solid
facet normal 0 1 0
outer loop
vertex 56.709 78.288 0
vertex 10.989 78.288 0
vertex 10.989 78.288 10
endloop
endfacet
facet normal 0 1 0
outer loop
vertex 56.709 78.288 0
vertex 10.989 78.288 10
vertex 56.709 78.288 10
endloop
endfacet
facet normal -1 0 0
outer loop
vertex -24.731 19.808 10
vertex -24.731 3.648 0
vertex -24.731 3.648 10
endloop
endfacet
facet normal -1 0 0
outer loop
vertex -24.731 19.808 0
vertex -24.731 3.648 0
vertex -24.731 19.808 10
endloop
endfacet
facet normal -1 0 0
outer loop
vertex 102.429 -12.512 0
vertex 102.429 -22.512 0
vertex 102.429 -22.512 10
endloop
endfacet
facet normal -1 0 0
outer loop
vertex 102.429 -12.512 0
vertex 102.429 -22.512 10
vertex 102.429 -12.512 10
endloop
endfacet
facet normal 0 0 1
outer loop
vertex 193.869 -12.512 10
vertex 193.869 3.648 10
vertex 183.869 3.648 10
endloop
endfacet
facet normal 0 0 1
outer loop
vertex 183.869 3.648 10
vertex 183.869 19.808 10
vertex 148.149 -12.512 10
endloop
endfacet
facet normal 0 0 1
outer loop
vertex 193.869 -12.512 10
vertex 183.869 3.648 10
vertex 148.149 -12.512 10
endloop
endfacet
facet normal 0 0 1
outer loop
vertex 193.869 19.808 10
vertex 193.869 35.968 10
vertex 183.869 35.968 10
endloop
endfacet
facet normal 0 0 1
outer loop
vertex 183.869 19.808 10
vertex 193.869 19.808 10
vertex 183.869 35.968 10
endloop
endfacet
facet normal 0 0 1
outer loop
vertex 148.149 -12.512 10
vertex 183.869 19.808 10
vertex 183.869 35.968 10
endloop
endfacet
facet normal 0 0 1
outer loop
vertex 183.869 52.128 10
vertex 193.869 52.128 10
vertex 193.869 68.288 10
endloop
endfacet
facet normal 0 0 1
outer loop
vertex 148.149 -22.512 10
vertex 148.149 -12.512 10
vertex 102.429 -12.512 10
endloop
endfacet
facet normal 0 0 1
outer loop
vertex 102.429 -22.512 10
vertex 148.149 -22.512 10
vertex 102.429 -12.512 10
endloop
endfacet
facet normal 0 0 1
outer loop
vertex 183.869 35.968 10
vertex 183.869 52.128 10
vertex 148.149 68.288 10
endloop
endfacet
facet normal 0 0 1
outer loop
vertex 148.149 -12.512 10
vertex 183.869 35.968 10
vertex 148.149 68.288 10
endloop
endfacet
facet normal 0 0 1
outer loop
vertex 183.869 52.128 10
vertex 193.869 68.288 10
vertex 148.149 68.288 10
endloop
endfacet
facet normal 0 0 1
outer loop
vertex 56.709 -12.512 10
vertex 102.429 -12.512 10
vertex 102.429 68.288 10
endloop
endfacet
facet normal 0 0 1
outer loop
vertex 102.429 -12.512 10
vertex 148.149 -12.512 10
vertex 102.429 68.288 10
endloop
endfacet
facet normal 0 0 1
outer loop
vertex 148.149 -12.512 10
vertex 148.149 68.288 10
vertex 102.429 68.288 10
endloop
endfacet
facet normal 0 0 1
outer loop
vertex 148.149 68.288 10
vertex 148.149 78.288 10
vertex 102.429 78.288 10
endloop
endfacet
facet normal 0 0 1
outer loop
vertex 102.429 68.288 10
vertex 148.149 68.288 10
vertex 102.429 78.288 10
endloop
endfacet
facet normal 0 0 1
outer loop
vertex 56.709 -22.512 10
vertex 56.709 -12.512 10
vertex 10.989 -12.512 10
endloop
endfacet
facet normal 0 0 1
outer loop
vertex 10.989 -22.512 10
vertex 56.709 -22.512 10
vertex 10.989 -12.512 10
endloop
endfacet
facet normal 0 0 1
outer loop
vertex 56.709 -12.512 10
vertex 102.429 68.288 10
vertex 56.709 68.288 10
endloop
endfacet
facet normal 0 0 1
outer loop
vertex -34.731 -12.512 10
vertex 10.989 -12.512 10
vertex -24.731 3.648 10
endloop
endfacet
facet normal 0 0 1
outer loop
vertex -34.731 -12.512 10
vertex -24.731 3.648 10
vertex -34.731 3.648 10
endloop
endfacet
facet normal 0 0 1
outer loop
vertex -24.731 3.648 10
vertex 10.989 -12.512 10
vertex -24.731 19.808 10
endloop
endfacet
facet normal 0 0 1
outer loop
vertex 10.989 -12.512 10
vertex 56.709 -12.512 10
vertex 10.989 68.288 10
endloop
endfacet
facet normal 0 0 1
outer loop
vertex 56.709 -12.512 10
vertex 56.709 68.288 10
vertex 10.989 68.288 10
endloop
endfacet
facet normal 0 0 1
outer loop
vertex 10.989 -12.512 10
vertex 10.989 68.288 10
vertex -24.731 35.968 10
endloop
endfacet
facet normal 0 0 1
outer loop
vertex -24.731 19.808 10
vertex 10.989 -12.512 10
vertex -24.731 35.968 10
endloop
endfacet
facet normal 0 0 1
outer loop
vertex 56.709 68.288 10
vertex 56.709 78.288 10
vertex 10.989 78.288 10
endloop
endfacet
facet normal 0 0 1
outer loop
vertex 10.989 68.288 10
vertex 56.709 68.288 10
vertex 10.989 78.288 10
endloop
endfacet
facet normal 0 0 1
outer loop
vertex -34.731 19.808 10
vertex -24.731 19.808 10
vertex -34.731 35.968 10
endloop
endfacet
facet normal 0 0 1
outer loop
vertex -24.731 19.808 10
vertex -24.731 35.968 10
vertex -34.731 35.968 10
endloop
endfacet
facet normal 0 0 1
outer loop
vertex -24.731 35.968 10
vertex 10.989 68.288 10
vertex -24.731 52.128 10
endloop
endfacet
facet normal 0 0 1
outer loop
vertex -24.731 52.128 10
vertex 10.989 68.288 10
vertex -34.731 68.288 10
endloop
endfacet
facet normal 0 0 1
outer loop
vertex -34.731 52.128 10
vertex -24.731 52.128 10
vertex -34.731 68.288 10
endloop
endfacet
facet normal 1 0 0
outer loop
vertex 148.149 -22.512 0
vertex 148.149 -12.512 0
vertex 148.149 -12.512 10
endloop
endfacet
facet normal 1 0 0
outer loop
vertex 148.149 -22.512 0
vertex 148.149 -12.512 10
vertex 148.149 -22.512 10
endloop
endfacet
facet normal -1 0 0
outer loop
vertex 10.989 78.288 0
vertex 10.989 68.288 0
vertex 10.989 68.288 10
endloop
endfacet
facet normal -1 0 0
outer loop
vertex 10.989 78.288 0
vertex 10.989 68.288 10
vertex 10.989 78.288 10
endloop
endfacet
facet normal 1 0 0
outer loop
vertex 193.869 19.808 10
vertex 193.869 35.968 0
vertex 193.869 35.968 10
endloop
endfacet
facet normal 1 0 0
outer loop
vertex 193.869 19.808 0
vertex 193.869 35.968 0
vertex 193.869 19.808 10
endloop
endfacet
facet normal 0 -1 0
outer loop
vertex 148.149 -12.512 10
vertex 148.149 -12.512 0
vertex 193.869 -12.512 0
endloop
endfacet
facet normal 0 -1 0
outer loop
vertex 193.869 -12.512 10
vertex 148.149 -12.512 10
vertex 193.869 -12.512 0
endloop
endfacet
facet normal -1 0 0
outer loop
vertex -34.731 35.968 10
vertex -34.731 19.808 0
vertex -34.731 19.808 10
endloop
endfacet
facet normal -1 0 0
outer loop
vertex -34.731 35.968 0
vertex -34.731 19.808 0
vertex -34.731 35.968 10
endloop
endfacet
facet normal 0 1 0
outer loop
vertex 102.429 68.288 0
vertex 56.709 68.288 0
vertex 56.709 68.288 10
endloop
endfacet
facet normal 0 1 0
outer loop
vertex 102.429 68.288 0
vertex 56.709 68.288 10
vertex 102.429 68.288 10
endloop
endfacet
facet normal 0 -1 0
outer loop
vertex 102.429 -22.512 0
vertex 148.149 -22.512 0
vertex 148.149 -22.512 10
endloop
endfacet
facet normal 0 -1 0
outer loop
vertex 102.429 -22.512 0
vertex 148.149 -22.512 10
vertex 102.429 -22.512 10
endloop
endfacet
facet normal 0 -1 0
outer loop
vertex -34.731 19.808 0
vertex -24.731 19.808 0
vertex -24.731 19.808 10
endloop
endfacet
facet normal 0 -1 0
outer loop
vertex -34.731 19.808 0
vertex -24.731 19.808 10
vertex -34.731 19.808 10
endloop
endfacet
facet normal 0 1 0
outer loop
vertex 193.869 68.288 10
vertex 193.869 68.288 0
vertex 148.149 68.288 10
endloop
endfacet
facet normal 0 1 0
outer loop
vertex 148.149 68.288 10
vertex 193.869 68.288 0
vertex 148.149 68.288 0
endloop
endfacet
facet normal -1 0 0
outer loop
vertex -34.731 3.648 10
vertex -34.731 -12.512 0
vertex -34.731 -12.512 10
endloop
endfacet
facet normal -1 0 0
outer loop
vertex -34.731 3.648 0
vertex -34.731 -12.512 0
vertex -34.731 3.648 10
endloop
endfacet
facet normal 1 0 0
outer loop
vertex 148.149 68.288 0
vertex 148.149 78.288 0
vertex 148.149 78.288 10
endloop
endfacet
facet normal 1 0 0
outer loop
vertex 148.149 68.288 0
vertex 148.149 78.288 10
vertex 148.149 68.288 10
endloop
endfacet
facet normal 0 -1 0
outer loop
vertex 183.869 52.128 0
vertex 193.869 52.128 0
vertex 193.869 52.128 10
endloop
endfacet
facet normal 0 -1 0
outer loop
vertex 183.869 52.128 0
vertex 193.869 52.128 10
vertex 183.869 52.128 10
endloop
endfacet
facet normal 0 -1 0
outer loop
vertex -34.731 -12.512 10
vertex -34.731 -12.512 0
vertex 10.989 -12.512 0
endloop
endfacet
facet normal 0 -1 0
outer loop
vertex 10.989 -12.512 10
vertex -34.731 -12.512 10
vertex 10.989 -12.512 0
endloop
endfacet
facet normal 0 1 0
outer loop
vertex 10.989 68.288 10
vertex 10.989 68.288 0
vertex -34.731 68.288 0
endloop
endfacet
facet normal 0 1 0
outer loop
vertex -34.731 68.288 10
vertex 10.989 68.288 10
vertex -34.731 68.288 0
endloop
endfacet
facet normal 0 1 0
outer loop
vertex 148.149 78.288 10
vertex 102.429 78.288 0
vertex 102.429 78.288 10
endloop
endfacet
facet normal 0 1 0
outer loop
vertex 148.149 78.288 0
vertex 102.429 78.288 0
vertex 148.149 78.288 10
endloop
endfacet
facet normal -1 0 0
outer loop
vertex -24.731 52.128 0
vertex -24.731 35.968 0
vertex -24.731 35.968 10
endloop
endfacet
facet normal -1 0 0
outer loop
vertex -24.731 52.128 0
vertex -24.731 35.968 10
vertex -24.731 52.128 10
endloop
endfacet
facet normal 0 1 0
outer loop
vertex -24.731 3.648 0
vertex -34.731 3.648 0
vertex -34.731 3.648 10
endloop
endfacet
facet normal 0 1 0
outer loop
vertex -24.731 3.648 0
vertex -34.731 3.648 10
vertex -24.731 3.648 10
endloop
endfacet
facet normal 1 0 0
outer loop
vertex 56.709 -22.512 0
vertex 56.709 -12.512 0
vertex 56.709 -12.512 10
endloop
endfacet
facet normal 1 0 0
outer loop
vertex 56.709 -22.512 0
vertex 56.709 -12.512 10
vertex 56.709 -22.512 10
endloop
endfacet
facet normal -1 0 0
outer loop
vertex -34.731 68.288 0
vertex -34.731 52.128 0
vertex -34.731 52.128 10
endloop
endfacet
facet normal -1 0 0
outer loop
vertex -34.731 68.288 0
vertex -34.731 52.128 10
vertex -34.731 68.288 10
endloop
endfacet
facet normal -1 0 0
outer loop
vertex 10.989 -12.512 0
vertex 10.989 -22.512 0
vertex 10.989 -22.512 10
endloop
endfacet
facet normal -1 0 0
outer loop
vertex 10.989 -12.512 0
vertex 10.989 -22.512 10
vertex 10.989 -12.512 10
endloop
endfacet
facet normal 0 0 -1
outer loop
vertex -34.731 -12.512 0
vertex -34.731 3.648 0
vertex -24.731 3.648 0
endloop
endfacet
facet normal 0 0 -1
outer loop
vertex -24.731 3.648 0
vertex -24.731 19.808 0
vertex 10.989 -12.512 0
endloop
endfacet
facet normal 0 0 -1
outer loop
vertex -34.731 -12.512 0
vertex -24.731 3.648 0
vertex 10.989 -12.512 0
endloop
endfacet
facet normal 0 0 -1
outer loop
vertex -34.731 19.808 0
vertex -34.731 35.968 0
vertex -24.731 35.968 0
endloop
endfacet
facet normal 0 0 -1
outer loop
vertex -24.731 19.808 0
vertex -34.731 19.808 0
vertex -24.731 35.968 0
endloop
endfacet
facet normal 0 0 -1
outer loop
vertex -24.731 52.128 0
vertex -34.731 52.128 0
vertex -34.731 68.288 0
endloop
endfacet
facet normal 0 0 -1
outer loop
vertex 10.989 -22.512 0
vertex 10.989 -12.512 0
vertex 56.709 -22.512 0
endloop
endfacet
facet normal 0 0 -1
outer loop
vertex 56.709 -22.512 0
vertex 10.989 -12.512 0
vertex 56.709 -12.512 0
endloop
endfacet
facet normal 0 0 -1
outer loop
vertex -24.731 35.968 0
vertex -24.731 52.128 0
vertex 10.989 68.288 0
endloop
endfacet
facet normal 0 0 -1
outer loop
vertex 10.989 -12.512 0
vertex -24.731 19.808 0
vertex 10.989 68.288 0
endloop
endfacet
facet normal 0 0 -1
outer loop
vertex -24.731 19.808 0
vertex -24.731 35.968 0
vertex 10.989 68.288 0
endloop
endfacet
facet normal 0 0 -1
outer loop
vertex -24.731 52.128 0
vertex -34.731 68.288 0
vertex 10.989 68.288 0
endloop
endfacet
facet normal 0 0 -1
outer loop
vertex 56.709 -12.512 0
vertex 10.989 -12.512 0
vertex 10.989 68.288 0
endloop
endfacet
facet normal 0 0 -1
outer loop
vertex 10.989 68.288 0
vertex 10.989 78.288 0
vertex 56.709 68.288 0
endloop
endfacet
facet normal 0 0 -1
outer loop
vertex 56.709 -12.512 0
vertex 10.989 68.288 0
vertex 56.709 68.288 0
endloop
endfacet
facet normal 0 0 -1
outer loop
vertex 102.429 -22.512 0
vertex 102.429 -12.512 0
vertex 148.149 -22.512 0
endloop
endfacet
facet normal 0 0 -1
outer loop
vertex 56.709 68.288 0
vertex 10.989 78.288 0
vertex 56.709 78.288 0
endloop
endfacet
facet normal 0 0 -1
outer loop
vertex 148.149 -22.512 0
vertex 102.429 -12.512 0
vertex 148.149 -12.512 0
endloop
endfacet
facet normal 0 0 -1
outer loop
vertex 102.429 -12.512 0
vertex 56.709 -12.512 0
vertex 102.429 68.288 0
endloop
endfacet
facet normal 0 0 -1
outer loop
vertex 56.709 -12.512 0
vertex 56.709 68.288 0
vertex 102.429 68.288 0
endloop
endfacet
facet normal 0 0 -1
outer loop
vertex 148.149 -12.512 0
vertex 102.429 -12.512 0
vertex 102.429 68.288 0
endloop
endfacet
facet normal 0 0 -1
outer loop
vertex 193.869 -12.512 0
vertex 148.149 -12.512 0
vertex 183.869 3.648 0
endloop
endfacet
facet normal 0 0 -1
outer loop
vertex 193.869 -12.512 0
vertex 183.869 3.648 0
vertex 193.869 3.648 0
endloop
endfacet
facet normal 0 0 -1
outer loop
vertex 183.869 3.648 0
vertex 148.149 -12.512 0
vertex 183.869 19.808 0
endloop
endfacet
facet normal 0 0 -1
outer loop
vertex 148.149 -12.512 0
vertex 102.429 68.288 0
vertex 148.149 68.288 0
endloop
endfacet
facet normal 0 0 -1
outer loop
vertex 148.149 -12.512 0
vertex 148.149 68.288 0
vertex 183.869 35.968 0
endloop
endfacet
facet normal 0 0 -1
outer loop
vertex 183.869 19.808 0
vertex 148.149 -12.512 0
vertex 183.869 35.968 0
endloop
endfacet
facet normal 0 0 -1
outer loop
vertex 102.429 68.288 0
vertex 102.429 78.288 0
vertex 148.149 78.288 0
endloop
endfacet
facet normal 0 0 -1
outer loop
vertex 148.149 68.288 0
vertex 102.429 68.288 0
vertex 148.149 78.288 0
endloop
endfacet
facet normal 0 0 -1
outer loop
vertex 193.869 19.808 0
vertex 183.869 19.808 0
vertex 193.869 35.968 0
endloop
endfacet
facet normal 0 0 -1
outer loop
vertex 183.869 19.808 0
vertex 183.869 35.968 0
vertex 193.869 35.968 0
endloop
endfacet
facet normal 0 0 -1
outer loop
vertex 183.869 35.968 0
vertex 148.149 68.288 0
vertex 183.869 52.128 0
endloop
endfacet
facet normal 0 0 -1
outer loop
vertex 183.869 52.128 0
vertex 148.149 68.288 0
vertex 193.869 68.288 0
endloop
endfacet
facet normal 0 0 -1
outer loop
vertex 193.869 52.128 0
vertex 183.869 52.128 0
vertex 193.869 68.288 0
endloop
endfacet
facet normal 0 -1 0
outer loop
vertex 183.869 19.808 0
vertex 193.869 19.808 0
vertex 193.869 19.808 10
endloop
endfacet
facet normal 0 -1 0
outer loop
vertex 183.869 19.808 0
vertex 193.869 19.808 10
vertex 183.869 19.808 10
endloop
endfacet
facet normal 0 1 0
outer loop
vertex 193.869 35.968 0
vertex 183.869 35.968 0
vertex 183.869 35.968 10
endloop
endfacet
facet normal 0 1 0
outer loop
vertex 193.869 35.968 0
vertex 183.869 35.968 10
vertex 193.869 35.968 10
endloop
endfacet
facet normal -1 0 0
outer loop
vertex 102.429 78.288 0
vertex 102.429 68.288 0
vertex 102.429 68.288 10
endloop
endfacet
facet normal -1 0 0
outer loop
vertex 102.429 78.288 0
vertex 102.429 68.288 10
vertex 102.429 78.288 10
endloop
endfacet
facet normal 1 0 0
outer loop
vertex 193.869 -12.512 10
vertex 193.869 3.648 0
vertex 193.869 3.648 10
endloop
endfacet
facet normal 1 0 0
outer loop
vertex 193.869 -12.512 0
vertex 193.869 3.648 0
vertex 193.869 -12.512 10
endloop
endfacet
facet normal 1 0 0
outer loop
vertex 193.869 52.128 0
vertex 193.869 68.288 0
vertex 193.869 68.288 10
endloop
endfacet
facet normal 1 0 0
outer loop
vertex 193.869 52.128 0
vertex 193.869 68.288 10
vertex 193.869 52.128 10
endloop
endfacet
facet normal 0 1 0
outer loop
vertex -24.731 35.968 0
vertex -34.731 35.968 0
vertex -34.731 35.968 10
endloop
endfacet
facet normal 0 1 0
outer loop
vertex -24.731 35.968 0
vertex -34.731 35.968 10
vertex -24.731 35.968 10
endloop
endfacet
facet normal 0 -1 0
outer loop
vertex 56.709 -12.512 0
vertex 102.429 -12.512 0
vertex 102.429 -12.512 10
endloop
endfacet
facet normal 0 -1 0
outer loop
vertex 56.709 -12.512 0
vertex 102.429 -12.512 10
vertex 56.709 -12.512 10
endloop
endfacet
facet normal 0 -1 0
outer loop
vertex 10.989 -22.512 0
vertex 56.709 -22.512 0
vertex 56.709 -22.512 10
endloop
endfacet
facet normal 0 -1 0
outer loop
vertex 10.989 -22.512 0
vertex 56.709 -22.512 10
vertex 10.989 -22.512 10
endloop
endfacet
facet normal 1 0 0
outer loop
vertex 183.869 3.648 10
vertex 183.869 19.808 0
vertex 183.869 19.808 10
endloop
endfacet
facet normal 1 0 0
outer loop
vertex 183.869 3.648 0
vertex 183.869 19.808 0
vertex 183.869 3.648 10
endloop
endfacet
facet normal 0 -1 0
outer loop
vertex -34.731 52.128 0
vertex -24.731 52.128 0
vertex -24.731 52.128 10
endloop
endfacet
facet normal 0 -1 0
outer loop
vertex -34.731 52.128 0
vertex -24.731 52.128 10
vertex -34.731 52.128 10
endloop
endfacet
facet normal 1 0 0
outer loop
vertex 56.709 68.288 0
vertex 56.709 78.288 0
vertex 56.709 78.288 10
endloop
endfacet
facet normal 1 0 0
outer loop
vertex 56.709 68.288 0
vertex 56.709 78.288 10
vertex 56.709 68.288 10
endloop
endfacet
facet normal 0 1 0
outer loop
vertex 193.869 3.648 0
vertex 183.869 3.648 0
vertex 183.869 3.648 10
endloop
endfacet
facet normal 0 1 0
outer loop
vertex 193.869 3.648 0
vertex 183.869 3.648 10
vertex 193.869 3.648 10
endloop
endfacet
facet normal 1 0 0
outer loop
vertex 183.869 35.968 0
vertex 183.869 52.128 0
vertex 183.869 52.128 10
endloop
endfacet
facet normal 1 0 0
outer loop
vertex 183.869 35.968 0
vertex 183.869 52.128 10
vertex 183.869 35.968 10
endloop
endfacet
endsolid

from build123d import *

# Parameters (mm, degrees)
SKETCH3_R           = 4
BOSS_EXTRUDE2_DEPTH = 10


with BuildPart() as part:
    # Sketch3 → Boss-Extrude2 (new body)
    # profile 1 of 5: a face of its own
    with BuildSketch(Plane.XY):
        Polygon((102.429124183, -12.51217232), (56.709124183, -12.51217232), (56.709124183, -22.51217232), (10.989124183, -22.51217232), (10.989124183, -12.51217232), (-24.730875817, -12.51217232), (-34.730875817, -12.51217232), (-34.730875817, 3.64782768), (-24.730875817, 3.64782768), (-24.730875817, 19.80782768), (-34.730875817, 19.80782768), (-34.730875817, 35.96782768), (-24.730875817, 35.96782768), (-24.730875817, 52.12782768), (-34.730875817, 52.12782768), (-34.730875817, 68.28782768), (-24.730875817, 68.28782768), (10.989124183, 68.28782768), (10.989124183, 78.28782768), (56.709124183, 78.28782768), (56.709124183, 68.28782768), (102.429124183, 68.28782768), (102.429124183, 78.28782768), (148.149124183, 78.28782768), (148.149124183, 68.28782768), (183.869124183, 68.28782768), (193.869124183, 68.28782768), (193.869124183, 52.12782768), (183.869124183, 52.12782768), (183.869124183, 35.96782768), (193.869124183, 35.96782768), (193.869124183, 19.80782768), (183.869124183, 19.80782768), (183.869124183, 3.64782768), (193.869124183, 3.64782768), (193.869124183, -12.51217232), (183.869124183, -12.51217232), (148.149124183, -12.51217232), (148.149124183, -22.51217232), (102.429124183, -22.51217232), align=None)
        with Locations((-12.030875817, 55.58782768)):
            Circle(SKETCH3_R, mode=Mode.SUBTRACT)
        with Locations((171.169124183, 55.58782768)):
            Circle(SKETCH3_R, mode=Mode.SUBTRACT)
        with Locations((-12.030875817, 0.18782768)):
            Circle(SKETCH3_R, mode=Mode.SUBTRACT)
        with Locations((171.169124183, 0.18782768)):
            Circle(SKETCH3_R, mode=Mode.SUBTRACT)
    # profile 2 of 5: a face of its own
    with BuildSketch(Plane.XY):
        with Locations((-12.030875817, 55.58782768)):
            Circle(SKETCH3_R)
    # profile 3 of 5: a face of its own
    with BuildSketch(Plane.XY):
        with Locations((-12.030875817, 0.18782768)):
            Circle(SKETCH3_R)
    # profile 4 of 5: a face of its own
    with BuildSketch(Plane.XY):
        with Locations((171.169124183, 0.18782768)):
            Circle(SKETCH3_R)
    # profile 5 of 5: a face of its own
    with BuildSketch(Plane.XY):
        with Locations((171.169124183, 55.58782768)):
            Circle(SKETCH3_R)
    extrude(amount=BOSS_EXTRUDE2_DEPTH)


solid = part.part
